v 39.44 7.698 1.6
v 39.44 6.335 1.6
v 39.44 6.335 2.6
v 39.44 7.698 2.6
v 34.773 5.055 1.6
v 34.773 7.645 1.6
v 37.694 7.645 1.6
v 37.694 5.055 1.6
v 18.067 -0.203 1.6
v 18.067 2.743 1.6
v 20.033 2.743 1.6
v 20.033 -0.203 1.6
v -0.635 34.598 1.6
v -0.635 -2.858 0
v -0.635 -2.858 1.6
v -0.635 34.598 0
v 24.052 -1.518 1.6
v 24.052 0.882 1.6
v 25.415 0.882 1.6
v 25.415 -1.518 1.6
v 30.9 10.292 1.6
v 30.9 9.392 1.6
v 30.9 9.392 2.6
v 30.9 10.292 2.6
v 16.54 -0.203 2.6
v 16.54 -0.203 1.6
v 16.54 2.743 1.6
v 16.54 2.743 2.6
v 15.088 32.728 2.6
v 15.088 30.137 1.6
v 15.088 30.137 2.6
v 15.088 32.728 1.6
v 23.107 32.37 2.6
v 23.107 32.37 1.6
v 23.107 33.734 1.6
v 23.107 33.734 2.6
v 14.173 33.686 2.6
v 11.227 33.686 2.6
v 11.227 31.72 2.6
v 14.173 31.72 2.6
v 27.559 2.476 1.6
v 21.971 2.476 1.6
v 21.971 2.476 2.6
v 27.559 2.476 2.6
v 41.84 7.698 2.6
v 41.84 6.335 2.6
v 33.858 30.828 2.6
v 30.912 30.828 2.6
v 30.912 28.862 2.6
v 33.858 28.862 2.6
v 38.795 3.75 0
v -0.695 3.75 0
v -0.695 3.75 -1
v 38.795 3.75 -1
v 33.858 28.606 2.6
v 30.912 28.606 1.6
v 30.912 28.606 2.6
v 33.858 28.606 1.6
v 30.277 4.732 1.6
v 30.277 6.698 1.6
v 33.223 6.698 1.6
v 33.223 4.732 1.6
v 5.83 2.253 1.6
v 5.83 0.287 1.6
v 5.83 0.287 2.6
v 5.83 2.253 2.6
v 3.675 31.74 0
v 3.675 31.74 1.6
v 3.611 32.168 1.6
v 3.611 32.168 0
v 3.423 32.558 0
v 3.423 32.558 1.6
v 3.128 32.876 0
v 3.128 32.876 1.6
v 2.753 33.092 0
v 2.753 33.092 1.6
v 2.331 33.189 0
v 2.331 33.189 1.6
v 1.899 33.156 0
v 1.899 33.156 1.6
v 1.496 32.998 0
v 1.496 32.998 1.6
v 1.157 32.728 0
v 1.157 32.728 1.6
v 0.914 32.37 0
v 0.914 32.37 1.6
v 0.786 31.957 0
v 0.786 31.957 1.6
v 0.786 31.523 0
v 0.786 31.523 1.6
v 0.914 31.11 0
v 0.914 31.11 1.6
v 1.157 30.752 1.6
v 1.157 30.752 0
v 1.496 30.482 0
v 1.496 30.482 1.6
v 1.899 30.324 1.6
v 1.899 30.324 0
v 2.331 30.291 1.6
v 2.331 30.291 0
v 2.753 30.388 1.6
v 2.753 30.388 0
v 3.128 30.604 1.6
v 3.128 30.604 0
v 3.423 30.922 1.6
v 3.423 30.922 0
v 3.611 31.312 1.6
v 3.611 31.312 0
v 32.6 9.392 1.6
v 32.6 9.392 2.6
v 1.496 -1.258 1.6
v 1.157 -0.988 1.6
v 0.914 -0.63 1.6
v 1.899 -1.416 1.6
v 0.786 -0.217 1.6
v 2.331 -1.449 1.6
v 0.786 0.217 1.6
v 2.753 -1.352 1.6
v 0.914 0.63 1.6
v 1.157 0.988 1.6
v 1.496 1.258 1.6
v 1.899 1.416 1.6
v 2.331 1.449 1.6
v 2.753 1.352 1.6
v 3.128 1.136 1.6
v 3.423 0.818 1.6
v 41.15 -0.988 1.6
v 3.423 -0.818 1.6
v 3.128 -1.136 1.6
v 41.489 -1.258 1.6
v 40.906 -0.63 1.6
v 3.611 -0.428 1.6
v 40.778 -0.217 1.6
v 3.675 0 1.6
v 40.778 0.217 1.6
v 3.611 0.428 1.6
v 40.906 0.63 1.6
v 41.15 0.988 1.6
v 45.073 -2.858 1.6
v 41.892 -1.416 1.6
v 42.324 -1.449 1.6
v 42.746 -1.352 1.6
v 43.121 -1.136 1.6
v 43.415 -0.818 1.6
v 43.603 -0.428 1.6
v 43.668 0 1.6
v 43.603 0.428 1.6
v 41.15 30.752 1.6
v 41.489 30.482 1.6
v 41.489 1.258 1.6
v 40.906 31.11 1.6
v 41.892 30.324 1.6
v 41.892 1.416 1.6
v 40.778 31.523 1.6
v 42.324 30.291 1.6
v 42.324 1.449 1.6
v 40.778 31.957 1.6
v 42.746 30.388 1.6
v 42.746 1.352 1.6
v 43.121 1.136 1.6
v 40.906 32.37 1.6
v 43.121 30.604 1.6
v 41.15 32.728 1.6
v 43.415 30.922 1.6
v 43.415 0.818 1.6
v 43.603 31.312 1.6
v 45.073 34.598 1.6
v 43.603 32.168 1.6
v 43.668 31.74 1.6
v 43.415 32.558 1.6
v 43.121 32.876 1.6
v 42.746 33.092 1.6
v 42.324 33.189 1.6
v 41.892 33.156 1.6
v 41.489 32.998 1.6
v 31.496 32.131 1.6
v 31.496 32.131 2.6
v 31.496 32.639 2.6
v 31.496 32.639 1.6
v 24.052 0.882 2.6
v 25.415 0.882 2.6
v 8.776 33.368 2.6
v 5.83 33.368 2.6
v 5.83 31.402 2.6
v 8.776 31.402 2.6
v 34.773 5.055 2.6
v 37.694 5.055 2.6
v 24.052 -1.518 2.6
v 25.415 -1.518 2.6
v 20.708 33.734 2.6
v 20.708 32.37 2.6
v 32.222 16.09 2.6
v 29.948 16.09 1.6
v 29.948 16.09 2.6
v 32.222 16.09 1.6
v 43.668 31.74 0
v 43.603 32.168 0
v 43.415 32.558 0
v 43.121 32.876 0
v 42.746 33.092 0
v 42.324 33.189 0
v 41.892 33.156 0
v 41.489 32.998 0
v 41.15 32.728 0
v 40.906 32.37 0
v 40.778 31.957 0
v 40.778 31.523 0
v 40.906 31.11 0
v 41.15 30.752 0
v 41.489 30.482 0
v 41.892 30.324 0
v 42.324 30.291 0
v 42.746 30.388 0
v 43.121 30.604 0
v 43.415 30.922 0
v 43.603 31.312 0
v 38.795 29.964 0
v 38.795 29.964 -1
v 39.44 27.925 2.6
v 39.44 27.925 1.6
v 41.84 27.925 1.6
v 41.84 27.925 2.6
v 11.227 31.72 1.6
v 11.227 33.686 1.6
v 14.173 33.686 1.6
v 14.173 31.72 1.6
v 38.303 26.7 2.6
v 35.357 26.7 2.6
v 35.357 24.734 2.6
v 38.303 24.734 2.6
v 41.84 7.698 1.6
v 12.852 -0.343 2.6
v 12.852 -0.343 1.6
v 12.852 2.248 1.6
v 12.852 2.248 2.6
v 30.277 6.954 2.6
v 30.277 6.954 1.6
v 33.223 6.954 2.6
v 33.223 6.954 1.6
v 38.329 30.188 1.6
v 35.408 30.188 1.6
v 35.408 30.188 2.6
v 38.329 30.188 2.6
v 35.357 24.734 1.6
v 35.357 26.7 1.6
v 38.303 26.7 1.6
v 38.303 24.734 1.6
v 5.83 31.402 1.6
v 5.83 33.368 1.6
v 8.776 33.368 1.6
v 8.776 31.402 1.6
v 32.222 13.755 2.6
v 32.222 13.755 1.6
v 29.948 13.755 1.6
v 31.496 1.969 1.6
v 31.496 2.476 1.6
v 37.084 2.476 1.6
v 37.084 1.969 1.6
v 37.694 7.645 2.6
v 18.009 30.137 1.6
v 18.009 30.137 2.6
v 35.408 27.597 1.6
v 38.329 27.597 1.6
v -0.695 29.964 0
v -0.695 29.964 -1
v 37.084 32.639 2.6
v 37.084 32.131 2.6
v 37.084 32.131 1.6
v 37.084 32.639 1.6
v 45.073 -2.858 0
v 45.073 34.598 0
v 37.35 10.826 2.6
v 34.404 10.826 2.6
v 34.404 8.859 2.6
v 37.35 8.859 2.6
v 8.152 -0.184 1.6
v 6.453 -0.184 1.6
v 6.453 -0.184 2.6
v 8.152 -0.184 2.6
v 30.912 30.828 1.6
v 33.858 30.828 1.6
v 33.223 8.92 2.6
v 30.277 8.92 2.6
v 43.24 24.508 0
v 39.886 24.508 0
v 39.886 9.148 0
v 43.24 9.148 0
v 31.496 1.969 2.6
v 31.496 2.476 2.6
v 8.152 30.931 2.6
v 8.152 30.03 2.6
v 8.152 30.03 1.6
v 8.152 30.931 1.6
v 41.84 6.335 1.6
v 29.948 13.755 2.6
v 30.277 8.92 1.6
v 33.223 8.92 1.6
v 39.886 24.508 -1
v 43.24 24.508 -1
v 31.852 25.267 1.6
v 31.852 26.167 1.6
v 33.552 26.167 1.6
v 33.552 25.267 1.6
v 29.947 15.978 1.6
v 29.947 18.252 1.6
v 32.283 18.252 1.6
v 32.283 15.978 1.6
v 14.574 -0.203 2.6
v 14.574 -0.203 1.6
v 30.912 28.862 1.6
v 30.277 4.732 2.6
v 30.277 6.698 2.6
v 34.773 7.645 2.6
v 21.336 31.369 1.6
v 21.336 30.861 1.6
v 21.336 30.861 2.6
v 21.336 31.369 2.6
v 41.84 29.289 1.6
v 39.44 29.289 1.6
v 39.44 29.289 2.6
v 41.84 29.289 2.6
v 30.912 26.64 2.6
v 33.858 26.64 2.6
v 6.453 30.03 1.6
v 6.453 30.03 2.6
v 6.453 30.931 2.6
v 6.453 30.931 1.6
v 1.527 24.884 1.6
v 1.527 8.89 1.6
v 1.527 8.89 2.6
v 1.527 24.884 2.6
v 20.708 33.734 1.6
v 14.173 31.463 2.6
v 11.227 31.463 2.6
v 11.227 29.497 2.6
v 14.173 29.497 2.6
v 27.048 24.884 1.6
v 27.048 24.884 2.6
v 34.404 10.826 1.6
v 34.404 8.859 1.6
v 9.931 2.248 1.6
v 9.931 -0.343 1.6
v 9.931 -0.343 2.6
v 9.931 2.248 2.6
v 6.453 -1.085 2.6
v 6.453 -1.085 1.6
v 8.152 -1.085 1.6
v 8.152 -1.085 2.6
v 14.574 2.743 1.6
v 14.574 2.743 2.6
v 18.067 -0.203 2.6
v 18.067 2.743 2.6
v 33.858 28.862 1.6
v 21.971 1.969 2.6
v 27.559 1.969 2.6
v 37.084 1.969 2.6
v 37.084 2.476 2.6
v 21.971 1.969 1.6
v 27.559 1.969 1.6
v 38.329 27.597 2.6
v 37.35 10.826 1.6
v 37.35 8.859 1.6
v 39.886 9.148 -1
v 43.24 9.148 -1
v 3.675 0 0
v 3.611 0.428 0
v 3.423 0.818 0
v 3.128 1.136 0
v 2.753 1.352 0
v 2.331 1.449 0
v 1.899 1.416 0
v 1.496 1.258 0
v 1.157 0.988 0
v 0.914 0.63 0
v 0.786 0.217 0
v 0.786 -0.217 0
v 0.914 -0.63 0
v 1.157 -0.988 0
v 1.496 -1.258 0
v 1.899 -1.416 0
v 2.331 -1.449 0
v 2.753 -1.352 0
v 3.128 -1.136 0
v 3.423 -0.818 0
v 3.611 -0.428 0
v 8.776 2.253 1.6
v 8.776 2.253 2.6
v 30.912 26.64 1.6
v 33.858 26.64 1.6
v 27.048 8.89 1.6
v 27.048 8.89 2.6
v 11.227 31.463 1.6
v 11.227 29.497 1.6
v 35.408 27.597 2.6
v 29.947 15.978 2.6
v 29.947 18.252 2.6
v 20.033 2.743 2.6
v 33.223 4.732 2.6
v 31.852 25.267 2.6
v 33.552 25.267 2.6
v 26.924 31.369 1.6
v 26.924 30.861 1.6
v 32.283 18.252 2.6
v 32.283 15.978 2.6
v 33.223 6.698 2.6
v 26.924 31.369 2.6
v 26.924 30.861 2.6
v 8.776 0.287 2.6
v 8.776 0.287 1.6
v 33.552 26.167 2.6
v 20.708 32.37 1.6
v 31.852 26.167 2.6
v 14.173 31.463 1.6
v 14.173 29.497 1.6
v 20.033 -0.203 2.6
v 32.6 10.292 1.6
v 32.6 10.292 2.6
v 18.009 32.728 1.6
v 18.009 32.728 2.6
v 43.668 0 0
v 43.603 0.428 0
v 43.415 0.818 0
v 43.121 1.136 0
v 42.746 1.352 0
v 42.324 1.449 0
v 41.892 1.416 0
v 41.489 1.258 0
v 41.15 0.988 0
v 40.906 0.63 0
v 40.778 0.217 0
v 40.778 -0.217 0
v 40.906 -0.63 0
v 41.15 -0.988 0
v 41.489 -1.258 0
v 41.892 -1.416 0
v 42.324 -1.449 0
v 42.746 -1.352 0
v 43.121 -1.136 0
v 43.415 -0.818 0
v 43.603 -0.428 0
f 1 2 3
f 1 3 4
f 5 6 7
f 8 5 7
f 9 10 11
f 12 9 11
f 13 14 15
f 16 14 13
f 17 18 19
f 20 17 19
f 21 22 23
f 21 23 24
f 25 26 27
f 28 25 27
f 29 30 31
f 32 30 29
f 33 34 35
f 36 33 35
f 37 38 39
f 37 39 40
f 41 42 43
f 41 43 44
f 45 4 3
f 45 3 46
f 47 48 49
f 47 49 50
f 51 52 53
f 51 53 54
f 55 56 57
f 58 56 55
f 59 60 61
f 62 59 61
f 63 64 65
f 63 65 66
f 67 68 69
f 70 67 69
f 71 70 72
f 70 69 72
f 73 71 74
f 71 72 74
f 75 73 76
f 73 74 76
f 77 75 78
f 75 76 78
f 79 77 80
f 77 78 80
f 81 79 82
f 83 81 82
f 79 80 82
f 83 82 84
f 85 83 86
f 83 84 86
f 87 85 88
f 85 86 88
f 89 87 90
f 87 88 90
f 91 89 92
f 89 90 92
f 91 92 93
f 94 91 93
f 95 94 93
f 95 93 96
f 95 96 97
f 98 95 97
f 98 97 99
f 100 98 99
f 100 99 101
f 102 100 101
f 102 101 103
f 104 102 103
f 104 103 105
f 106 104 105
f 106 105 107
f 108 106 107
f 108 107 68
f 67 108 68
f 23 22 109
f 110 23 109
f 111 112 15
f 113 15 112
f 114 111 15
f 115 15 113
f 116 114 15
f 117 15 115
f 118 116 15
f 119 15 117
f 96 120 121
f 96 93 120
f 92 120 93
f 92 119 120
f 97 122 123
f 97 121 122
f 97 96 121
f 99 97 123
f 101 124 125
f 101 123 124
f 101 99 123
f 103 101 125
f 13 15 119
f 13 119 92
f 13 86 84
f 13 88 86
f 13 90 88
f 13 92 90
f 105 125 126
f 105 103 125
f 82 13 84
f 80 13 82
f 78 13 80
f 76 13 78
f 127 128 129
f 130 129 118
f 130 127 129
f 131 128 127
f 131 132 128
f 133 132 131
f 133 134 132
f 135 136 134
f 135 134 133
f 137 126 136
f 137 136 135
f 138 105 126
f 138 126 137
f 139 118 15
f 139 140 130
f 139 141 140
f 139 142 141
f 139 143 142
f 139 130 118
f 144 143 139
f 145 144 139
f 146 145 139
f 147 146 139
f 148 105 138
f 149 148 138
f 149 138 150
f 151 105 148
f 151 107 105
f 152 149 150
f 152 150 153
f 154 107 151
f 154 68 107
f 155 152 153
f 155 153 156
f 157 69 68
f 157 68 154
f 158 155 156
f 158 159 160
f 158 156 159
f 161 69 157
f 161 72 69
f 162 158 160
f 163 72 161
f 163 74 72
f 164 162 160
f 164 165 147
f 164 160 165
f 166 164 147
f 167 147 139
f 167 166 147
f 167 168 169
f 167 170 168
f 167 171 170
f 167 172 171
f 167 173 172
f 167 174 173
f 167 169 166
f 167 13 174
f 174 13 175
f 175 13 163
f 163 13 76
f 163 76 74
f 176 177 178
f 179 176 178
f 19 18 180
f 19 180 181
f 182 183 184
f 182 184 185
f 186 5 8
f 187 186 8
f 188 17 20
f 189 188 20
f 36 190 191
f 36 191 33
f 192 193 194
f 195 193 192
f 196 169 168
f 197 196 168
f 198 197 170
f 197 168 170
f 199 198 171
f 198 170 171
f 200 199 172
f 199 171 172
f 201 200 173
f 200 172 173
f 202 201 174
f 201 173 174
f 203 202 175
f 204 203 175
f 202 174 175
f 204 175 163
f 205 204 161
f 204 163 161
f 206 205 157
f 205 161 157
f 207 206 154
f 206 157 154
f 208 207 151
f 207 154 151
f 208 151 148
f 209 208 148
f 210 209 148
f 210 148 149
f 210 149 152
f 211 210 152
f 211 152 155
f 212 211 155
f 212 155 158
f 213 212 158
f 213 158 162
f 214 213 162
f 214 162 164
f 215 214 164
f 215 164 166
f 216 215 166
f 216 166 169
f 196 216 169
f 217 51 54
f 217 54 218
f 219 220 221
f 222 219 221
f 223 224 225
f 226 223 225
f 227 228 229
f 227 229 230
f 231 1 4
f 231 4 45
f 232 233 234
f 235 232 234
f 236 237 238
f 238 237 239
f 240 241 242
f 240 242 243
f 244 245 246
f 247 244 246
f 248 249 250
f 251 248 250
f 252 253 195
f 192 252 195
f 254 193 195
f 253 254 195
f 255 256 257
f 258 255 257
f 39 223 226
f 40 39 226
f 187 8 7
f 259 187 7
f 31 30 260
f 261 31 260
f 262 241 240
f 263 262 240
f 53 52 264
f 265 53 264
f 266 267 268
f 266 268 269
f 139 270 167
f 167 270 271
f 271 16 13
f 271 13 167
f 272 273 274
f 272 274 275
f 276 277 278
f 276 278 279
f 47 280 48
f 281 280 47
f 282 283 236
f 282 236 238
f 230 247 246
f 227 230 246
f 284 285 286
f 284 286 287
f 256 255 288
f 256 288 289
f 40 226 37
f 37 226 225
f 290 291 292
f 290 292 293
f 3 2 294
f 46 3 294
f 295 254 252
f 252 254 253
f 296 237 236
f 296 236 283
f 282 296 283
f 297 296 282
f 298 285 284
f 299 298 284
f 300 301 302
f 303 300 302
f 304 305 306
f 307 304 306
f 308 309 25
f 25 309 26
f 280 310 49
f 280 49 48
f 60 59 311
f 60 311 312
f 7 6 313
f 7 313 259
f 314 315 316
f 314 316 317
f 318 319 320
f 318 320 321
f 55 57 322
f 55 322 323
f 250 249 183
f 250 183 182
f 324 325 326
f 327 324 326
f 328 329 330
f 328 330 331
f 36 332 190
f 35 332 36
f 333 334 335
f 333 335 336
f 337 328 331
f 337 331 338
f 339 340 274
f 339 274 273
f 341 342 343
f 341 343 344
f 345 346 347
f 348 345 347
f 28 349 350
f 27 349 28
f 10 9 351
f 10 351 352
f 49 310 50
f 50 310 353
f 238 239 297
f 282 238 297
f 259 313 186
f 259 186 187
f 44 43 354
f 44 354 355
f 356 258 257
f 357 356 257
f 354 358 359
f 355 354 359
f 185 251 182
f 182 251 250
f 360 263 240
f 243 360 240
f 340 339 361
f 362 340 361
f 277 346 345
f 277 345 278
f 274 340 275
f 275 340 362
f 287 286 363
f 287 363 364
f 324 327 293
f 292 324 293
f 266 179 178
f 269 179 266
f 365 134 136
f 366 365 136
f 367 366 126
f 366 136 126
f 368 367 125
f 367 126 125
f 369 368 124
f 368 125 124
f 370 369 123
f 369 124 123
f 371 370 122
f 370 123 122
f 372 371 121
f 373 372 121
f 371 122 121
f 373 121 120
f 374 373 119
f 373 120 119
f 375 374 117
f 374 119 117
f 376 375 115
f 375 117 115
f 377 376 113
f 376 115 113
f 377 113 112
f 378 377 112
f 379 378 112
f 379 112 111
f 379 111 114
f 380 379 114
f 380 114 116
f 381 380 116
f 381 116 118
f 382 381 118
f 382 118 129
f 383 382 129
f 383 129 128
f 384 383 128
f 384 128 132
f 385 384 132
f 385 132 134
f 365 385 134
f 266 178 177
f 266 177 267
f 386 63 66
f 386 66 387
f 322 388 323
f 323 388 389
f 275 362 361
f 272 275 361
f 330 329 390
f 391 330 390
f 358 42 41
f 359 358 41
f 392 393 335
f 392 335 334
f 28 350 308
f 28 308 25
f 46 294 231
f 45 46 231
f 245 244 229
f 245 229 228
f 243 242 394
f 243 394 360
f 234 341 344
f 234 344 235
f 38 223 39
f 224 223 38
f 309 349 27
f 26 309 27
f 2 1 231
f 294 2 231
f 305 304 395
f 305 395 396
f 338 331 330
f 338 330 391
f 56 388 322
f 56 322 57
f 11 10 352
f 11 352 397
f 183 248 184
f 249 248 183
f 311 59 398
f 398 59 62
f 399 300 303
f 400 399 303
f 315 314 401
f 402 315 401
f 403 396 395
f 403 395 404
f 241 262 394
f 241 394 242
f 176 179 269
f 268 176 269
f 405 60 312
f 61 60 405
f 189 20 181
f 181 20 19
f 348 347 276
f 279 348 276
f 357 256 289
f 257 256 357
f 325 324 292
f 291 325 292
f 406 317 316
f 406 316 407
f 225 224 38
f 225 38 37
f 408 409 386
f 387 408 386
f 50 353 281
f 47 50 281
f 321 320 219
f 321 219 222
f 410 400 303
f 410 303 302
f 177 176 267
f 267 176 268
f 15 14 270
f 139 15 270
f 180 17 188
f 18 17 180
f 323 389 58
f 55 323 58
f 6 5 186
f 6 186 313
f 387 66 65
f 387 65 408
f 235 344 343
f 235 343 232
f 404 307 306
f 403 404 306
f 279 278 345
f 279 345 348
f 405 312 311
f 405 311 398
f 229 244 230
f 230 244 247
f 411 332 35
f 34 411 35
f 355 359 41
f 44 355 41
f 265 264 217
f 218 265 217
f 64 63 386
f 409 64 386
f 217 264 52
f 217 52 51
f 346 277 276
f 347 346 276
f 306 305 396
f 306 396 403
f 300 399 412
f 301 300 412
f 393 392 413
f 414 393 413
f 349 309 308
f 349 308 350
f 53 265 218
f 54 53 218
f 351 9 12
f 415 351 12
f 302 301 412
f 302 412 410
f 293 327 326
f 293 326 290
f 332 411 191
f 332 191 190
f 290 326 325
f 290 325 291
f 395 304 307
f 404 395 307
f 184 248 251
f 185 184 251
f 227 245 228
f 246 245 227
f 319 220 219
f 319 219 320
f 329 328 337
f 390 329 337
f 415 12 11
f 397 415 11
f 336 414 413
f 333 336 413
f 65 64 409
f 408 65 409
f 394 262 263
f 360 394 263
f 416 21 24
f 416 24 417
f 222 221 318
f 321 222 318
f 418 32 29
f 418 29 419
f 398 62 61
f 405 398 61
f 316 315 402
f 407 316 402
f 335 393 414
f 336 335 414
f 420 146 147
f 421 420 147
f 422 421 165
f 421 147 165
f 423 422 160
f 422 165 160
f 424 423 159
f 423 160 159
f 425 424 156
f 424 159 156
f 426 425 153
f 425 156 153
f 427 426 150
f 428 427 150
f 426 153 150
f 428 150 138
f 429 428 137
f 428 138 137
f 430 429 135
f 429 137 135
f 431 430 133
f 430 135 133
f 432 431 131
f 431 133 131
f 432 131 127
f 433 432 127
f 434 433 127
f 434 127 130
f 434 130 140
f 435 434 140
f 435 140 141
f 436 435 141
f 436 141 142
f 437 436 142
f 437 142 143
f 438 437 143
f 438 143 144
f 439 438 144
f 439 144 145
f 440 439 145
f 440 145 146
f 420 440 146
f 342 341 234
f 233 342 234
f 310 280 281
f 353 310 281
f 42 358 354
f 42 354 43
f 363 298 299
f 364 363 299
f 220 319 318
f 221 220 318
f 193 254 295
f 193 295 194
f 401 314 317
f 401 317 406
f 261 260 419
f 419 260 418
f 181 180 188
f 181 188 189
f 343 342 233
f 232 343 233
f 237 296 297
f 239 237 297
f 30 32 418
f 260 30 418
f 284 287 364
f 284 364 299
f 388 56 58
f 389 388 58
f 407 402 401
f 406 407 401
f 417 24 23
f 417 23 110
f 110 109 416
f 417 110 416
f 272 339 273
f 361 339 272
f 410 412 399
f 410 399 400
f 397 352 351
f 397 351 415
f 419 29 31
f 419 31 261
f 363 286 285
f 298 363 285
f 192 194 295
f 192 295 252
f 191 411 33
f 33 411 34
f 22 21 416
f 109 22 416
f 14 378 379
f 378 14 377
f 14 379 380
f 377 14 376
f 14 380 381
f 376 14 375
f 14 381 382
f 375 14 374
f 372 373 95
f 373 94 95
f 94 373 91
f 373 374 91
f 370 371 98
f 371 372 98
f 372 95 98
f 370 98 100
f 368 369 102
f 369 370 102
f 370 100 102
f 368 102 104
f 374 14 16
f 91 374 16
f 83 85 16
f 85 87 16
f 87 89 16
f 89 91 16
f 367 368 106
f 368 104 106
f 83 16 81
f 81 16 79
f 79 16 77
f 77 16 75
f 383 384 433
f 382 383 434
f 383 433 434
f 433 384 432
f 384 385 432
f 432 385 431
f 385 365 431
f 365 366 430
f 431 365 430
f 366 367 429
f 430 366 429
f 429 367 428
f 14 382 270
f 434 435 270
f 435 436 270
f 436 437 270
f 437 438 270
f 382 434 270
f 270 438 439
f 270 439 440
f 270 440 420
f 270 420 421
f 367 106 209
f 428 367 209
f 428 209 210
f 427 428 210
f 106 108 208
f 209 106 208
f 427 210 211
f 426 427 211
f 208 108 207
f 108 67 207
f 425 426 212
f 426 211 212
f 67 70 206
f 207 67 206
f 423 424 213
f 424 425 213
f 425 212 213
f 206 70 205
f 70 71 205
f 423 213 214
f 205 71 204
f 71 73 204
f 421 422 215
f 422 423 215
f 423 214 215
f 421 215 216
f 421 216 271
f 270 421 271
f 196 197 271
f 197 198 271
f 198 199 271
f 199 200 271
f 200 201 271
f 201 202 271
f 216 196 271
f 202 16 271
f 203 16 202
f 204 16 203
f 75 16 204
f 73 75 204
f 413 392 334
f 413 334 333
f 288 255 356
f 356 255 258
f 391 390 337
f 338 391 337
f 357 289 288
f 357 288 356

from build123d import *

# Parameters (mm, degrees)
SKETCH1_W                                      = 45.7075
SKETCH1_H                                      = 37.455
BOARD_DEPTH                                    = 1.6
SKETCH2_W                                      = 2.273
SKETCH2_H                                      = 2.3356
HDRV1W64P0_1X1_193X193X447B_1_DEPTH            = 1
SKETCH3_W                                      = 2.3356
SKETCH3_H                                      = 2.273
HDRV1W64P0_1X1_193X193X447B_2_DEPTH            = 1
SKETCH4_W                                      = 2.4
SKETCH4_H                                      = 1.3635
SOD_323F_1_DEPTH                               = 1
SKETCH5_W                                      = 1.3635
SKETCH5_H                                      = 2.4
SOD_323F_2_DEPTH                               = 1
SKETCH6_W                                      = 2.4
SKETCH6_H                                      = 1.3635
SOD_323F_3_DEPTH                               = 1
SKETCH7_W                                      = 2.4
SKETCH7_H                                      = 1.3635
SOD_323F_4_DEPTH                               = 1
SKETCH8_W                                      = 5.588
SKETCH8_H                                      = 0.508
F_1X03_CLEANBIG_1_DEPTH                        = 1
SKETCH9_W                                      = 5.588
SKETCH9_H                                      = 0.508
F_1X03_CLEANBIG_2_DEPTH                        = 1
SKETCH10_W                                     = 5.588
SKETCH10_H                                     = 0.508
F_1X03_CLEANBIG_3_DEPTH                        = 1
SKETCH11_W                                     = 5.588
SKETCH11_H                                     = 0.508
F_1X03_CLEANBIG_4_DEPTH                        = 1
SKETCH12_W                                     = 1.7
SKETCH12_H                                     = 0.9008
CHIP_LED0603_1_DEPTH                           = 1
SKETCH13_W                                     = 1.7
SKETCH13_H                                     = 0.9008
CHIP_LED0603_2_DEPTH                           = 1
SKETCH14_W                                     = 1.7
SKETCH14_H                                     = 0.9008
CHIP_LED0603_3_DEPTH                           = 1
SKETCH15_W                                     = 1.7
SKETCH15_H                                     = 0.9008
CHIP_LED0603_4_DEPTH                           = 1
SKETCH16_W                                     = 2.921
SKETCH16_H                                     = 2.5908
SOT23_1_DEPTH                                  = 1
SKETCH17_W                                     = 2.921
SKETCH17_H                                     = 2.5908
SOT23_2_DEPTH                                  = 1
SKETCH18_W                                     = 2.921
SKETCH18_H                                     = 2.5908
SOT23_3_DEPTH                                  = 1
SKETCH19_W                                     = 2.921
SKETCH19_H                                     = 2.5908
SOT23_4_DEPTH                                  = 1
SKETCH20_W                                     = 2.946
SKETCH20_H                                     = 1.966
EXTRUDE_R0603_1_DEPTH                          = 1
SKETCH21_W                                     = 2.946
SKETCH21_H                                     = 1.966
EXTRUDE_R0603_2_DEPTH                          = 1
SKETCH22_W                                     = 2.946
SKETCH22_H                                     = 1.966
EXTRUDE_R0603_3_DEPTH                          = 1
SKETCH23_W                                     = 1.966
SKETCH23_H                                     = 2.946
EXTRUDE_R0603_4_DEPTH                          = 1
SKETCH24_W                                     = 1.966
SKETCH24_H                                     = 2.946
EXTRUDE_R0603_5_DEPTH                          = 1
SKETCH25_W                                     = 2.946
SKETCH25_H                                     = 1.966
EXTRUDE_R0603_6_DEPTH                          = 1
SKETCH26_W                                     = 2.946
SKETCH26_H                                     = 1.966
EXTRUDE_R0603_7_DEPTH                          = 1
SKETCH27_W                                     = 2.946
SKETCH27_H                                     = 1.966
EXTRUDE_R0603_8_DEPTH                          = 1
SKETCH28_W                                     = 2.946
SKETCH28_H                                     = 1.966
EXTRUDE_R0603_9_DEPTH                          = 1
SKETCH29_W                                     = 2.946
SKETCH29_H                                     = 1.966
EXTRUDE_R0603_10_DEPTH                         = 1
SKETCH30_W                                     = 2.946
SKETCH30_H                                     = 1.966
EXTRUDE_R0603_11_DEPTH                         = 1
SKETCH31_W                                     = 2.946
SKETCH31_H                                     = 1.966
EXTRUDE_R0603_12_DEPTH                         = 1
SKETCH32_W                                     = 25.52
SKETCH32_H                                     = 15.994
HDRVR10W64P254_1X10_2540X254X254B_1_DEPTH      = 1
SKETCH33_W                                     = 39.49
SKETCH33_H                                     = 26.214
HDRVR16W64P2286X254_2X8_2032X2540X254B_1_DEPTH = 1
SKETCH34_W                                     = 3.354
SKETCH34_H                                     = 15.36
HDRVR6W64P254_1X6_1524X254X762B_1_DEPTH        = 1
SKETCH35_R                                     = 1.45288
CUT_EXTRUDE1_DEPTH                             = 57.879497734


with BuildPart() as part:
    # Sketch1 → BOARD (new body)
    with BuildSketch(Plane.XY):
        with Locations((22.21875, 15.87)):
            Rectangle(SKETCH1_W, SKETCH1_H)
    extrude(amount=BOARD_DEPTH)

    # Sketch35 → Cut-Extrude1 (cut, through all)
    with BuildSketch(Plane.XY.offset(1.6)):
        with Locations((2.2225, 31.74)):
            Circle(SKETCH35_R)
        with Locations((42.215, 31.74)):
            Circle(SKETCH35_R)
        with Locations((42.215, 0)):
            Circle(SKETCH35_R)
        with Locations((2.2225, 0)):
            Circle(SKETCH35_R)
    extrude(amount=-CUT_EXTRUDE1_DEPTH, mode=Mode.SUBTRACT)


with BuildPart() as body_2:
    # Sketch2 → HDRV1W64P0_1X1_193X193X447B-1 (new body)
    with BuildSketch(Plane.XY.offset(1.6)):
        with Locations((31.085, 14.9225)):
            Rectangle(SKETCH2_W, SKETCH2_H)
    extrude(amount=HDRV1W64P0_1X1_193X193X447B_1_DEPTH)


with BuildPart() as body_3:
    # Sketch3 → HDRV1W64P0_1X1_193X193X447B-2 (new body)
    with BuildSketch(Plane.XY.offset(1.6)):
        with Locations((31.115, 17.115)):
            Rectangle(SKETCH3_W, SKETCH3_H)
    extrude(amount=HDRV1W64P0_1X1_193X193X447B_2_DEPTH)


with BuildPart() as body_4:
    # Sketch4 → SOD-323F-1 (new body)
    with BuildSketch(Plane.XY.offset(1.6)):
        with Locations((21.9075, 33.05175)):
            Rectangle(SKETCH4_W, SKETCH4_H)
    extrude(amount=SOD_323F_1_DEPTH)


with BuildPart() as body_5:
    # Sketch5 → SOD-323F-2 (new body)
    with BuildSketch(Plane.XY.offset(1.6)):
        with Locations((24.73325, -0.3175)):
            Rectangle(SKETCH5_W, SKETCH5_H)
    extrude(amount=SOD_323F_2_DEPTH)


with BuildPart() as body_6:
    # Sketch6 → SOD-323F-3 (new body)
    with BuildSketch(Plane.XY.offset(1.6)):
        with Locations((40.64, 28.60675)):
            Rectangle(SKETCH6_W, SKETCH6_H)
    extrude(amount=SOD_323F_3_DEPTH)


with BuildPart() as body_7:
    # Sketch7 → SOD-323F-4 (new body)
    with BuildSketch(Plane.XY.offset(1.6)):
        with Locations((40.64, 7.01675)):
            Rectangle(SKETCH7_W, SKETCH7_H)
    extrude(amount=SOD_323F_4_DEPTH)


with BuildPart() as body_8:
    # Sketch8 → 1X03-CLEANBIG-1 (new body)
    with BuildSketch(Plane.XY.offset(1.6)):
        with Locations((24.13, 31.115)):
            Rectangle(SKETCH8_W, SKETCH8_H)
    extrude(amount=F_1X03_CLEANBIG_1_DEPTH)


with BuildPart() as body_9:
    # Sketch9 → 1X03-CLEANBIG-2 (new body)
    with BuildSketch(Plane.XY.offset(1.6)):
        with Locations((24.765, 2.2225)):
            Rectangle(SKETCH9_W, SKETCH9_H)
    extrude(amount=F_1X03_CLEANBIG_2_DEPTH)


with BuildPart() as body_10:
    # Sketch10 → 1X03-CLEANBIG-3 (new body)
    with BuildSketch(Plane.XY.offset(1.6)):
        with Locations((34.29, 32.385)):
            Rectangle(SKETCH10_W, SKETCH10_H)
    extrude(amount=F_1X03_CLEANBIG_3_DEPTH)


with BuildPart() as body_11:
    # Sketch11 → 1X03-CLEANBIG-4 (new body)
    with BuildSketch(Plane.XY.offset(1.6)):
        with Locations((34.29, 2.2225)):
            Rectangle(SKETCH11_W, SKETCH11_H)
    extrude(amount=F_1X03_CLEANBIG_4_DEPTH)


with BuildPart() as body_12:
    # Sketch12 → CHIP-LED0603-1 (new body)
    with BuildSketch(Plane.XY.offset(1.6)):
        with Locations((7.3025, 30.4804)):
            Rectangle(SKETCH12_W, SKETCH12_H)
    extrude(amount=CHIP_LED0603_1_DEPTH)


with BuildPart() as body_13:
    # Sketch13 → CHIP-LED0603-2 (new body)
    with BuildSketch(Plane.XY.offset(1.6)):
        with Locations((7.3025, -0.6346)):
            Rectangle(SKETCH13_W, SKETCH13_H)
    extrude(amount=CHIP_LED0603_2_DEPTH)


with BuildPart() as body_14:
    # Sketch14 → CHIP-LED0603-3 (new body)
    with BuildSketch(Plane.XY.offset(1.6)):
        with Locations((32.7025, 25.7171)):
            Rectangle(SKETCH14_W, SKETCH14_H)
    extrude(amount=CHIP_LED0603_3_DEPTH)


with BuildPart() as body_15:
    # Sketch15 → CHIP-LED0603-4 (new body)
    with BuildSketch(Plane.XY.offset(1.6)):
        with Locations((31.75, 9.8421)):
            Rectangle(SKETCH15_W, SKETCH15_H)
    extrude(amount=CHIP_LED0603_4_DEPTH)


with BuildPart() as body_16:
    # Sketch16 → SOT23-1 (new body)
    with BuildSketch(Plane.XY.offset(1.6)):
        with Locations((16.5481, 31.4325)):
            Rectangle(SKETCH16_W, SKETCH16_H)
    extrude(amount=SOT23_1_DEPTH)


with BuildPart() as body_17:
    # Sketch17 → SOT23-2 (new body)
    with BuildSketch(Plane.XY.offset(1.6)):
        with Locations((11.3919, 0.9525)):
            Rectangle(SKETCH17_W, SKETCH17_H)
    extrude(amount=SOT23_2_DEPTH)


with BuildPart() as body_18:
    # Sketch18 → SOT23-3 (new body)
    with BuildSketch(Plane.XY.offset(1.6)):
        with Locations((36.8681, 28.8925)):
            Rectangle(SKETCH18_W, SKETCH18_H)
    extrude(amount=SOT23_3_DEPTH)


with BuildPart() as body_19:
    # Sketch19 → SOT23-4 (new body)
    with BuildSketch(Plane.XY.offset(1.6)):
        with Locations((36.2331, 6.35)):
            Rectangle(SKETCH19_W, SKETCH19_H)
    extrude(amount=SOT23_4_DEPTH)


with BuildPart() as body_20:
    # Sketch20 → Extrude R0603-1 (new body)
    with BuildSketch(Plane.XY.offset(1.6)):
        with Locations((12.7, 30.48)):
            Rectangle(SKETCH20_W, SKETCH20_H)
    extrude(amount=EXTRUDE_R0603_1_DEPTH)


with BuildPart() as body_21:
    # Sketch21 → Extrude R0603-2 (new body)
    with BuildSketch(Plane.XY.offset(1.6)):
        with Locations((12.7, 32.7025)):
            Rectangle(SKETCH21_W, SKETCH21_H)
    extrude(amount=EXTRUDE_R0603_2_DEPTH)


with BuildPart() as body_22:
    # Sketch22 → Extrude R0603-3 (new body)
    with BuildSketch(Plane.XY.offset(1.6)):
        with Locations((7.3025, 32.385)):
            Rectangle(SKETCH22_W, SKETCH22_H)
    extrude(amount=EXTRUDE_R0603_3_DEPTH)


with BuildPart() as body_23:
    # Sketch23 → Extrude R0603-4 (new body)
    with BuildSketch(Plane.XY.offset(1.6)):
        with Locations((19.05, 1.27)):
            Rectangle(SKETCH23_W, SKETCH23_H)
    extrude(amount=EXTRUDE_R0603_4_DEPTH)


with BuildPart() as body_24:
    # Sketch24 → Extrude R0603-5 (new body)
    with BuildSketch(Plane.XY.offset(1.6)):
        with Locations((15.5575, 1.27)):
            Rectangle(SKETCH24_W, SKETCH24_H)
    extrude(amount=EXTRUDE_R0603_5_DEPTH)


with BuildPart() as body_25:
    # Sketch25 → Extrude R0603-6 (new body)
    with BuildSketch(Plane.XY.offset(1.6)):
        with Locations((7.3025, 1.27)):
            Rectangle(SKETCH25_W, SKETCH25_H)
    extrude(amount=EXTRUDE_R0603_6_DEPTH)


with BuildPart() as body_26:
    # Sketch26 → Extrude R0603-7 (new body)
    with BuildSketch(Plane.XY.offset(1.6)):
        with Locations((32.385, 29.845)):
            Rectangle(SKETCH26_W, SKETCH26_H)
    extrude(amount=EXTRUDE_R0603_7_DEPTH)


with BuildPart() as body_27:
    # Sketch27 → Extrude R0603-8 (new body)
    with BuildSketch(Plane.XY.offset(1.6)):
        with Locations((36.83, 25.7175)):
            Rectangle(SKETCH27_W, SKETCH27_H)
    extrude(amount=EXTRUDE_R0603_8_DEPTH)


with BuildPart() as body_28:
    # Sketch28 → Extrude R0603-9 (new body)
    with BuildSketch(Plane.XY.offset(1.6)):
        with Locations((32.385, 27.6225)):
            Rectangle(SKETCH28_W, SKETCH28_H)
    extrude(amount=EXTRUDE_R0603_9_DEPTH)


with BuildPart() as body_29:
    # Sketch29 → Extrude R0603-10 (new body)
    with BuildSketch(Plane.XY.offset(1.6)):
        with Locations((31.75, 5.715)):
            Rectangle(SKETCH29_W, SKETCH29_H)
    extrude(amount=EXTRUDE_R0603_10_DEPTH)


with BuildPart() as body_30:
    # Sketch30 → Extrude R0603-11 (new body)
    with BuildSketch(Plane.XY.offset(1.6)):
        with Locations((35.8775, 9.8425)):
            Rectangle(SKETCH30_W, SKETCH30_H)
    extrude(amount=EXTRUDE_R0603_11_DEPTH)


with BuildPart() as body_31:
    # Sketch31 → Extrude R0603-12 (new body)
    with BuildSketch(Plane.XY.offset(1.6)):
        with Locations((31.75, 7.9375)):
            Rectangle(SKETCH31_W, SKETCH31_H)
    extrude(amount=EXTRUDE_R0603_12_DEPTH)


with BuildPart() as body_32:
    # Sketch32 → HDRVR10W64P254_1X10_2540X254X254B-1 (new body)
    with BuildSketch(Plane.XY.offset(1.6)):
        with Locations((14.2875, 16.887)):
            Rectangle(SKETCH32_W, SKETCH32_H)
    extrude(amount=HDRVR10W64P254_1X10_2540X254X254B_1_DEPTH)


with BuildPart() as body_33:
    # Sketch33 → HDRVR16W64P2286X254_2X8_2032X2540X254B-1 (new body)
    with BuildSketch(Plane.XY):
        with Locations((19.05, 16.857)):
            Rectangle(SKETCH33_W, SKETCH33_H)
    extrude(amount=-HDRVR16W64P2286X254_2X8_2032X2540X254B_1_DEPTH)


with BuildPart() as body_34:
    # Sketch34 → HDRVR6W64P254_1X6_1524X254X762B-1 (new body)
    with BuildSketch(Plane.XY):
        with Locations((41.563, 16.8275)):
            Rectangle(SKETCH34_W, SKETCH34_H)
    extrude(amount=-HDRVR6W64P254_1X6_1524X254X762B_1_DEPTH)


solid = Compound([part.part, body_2.part, body_3.part, body_4.part, body_5.part, body_6.part, body_7.part, body_8.part, body_9.part, body_10.part, body_11.part, body_12.part, body_13.part, body_14.part, body_15.part, body_16.part, body_17.part, body_18.part, body_19.part, body_20.part, body_21.part, body_22.part, body_23.part, body_24.part, body_25.part, body_26.part, body_27.part, body_28.part, body_29.part, body_30.part, body_31.part, body_32.part, body_33.part, body_34.part])
